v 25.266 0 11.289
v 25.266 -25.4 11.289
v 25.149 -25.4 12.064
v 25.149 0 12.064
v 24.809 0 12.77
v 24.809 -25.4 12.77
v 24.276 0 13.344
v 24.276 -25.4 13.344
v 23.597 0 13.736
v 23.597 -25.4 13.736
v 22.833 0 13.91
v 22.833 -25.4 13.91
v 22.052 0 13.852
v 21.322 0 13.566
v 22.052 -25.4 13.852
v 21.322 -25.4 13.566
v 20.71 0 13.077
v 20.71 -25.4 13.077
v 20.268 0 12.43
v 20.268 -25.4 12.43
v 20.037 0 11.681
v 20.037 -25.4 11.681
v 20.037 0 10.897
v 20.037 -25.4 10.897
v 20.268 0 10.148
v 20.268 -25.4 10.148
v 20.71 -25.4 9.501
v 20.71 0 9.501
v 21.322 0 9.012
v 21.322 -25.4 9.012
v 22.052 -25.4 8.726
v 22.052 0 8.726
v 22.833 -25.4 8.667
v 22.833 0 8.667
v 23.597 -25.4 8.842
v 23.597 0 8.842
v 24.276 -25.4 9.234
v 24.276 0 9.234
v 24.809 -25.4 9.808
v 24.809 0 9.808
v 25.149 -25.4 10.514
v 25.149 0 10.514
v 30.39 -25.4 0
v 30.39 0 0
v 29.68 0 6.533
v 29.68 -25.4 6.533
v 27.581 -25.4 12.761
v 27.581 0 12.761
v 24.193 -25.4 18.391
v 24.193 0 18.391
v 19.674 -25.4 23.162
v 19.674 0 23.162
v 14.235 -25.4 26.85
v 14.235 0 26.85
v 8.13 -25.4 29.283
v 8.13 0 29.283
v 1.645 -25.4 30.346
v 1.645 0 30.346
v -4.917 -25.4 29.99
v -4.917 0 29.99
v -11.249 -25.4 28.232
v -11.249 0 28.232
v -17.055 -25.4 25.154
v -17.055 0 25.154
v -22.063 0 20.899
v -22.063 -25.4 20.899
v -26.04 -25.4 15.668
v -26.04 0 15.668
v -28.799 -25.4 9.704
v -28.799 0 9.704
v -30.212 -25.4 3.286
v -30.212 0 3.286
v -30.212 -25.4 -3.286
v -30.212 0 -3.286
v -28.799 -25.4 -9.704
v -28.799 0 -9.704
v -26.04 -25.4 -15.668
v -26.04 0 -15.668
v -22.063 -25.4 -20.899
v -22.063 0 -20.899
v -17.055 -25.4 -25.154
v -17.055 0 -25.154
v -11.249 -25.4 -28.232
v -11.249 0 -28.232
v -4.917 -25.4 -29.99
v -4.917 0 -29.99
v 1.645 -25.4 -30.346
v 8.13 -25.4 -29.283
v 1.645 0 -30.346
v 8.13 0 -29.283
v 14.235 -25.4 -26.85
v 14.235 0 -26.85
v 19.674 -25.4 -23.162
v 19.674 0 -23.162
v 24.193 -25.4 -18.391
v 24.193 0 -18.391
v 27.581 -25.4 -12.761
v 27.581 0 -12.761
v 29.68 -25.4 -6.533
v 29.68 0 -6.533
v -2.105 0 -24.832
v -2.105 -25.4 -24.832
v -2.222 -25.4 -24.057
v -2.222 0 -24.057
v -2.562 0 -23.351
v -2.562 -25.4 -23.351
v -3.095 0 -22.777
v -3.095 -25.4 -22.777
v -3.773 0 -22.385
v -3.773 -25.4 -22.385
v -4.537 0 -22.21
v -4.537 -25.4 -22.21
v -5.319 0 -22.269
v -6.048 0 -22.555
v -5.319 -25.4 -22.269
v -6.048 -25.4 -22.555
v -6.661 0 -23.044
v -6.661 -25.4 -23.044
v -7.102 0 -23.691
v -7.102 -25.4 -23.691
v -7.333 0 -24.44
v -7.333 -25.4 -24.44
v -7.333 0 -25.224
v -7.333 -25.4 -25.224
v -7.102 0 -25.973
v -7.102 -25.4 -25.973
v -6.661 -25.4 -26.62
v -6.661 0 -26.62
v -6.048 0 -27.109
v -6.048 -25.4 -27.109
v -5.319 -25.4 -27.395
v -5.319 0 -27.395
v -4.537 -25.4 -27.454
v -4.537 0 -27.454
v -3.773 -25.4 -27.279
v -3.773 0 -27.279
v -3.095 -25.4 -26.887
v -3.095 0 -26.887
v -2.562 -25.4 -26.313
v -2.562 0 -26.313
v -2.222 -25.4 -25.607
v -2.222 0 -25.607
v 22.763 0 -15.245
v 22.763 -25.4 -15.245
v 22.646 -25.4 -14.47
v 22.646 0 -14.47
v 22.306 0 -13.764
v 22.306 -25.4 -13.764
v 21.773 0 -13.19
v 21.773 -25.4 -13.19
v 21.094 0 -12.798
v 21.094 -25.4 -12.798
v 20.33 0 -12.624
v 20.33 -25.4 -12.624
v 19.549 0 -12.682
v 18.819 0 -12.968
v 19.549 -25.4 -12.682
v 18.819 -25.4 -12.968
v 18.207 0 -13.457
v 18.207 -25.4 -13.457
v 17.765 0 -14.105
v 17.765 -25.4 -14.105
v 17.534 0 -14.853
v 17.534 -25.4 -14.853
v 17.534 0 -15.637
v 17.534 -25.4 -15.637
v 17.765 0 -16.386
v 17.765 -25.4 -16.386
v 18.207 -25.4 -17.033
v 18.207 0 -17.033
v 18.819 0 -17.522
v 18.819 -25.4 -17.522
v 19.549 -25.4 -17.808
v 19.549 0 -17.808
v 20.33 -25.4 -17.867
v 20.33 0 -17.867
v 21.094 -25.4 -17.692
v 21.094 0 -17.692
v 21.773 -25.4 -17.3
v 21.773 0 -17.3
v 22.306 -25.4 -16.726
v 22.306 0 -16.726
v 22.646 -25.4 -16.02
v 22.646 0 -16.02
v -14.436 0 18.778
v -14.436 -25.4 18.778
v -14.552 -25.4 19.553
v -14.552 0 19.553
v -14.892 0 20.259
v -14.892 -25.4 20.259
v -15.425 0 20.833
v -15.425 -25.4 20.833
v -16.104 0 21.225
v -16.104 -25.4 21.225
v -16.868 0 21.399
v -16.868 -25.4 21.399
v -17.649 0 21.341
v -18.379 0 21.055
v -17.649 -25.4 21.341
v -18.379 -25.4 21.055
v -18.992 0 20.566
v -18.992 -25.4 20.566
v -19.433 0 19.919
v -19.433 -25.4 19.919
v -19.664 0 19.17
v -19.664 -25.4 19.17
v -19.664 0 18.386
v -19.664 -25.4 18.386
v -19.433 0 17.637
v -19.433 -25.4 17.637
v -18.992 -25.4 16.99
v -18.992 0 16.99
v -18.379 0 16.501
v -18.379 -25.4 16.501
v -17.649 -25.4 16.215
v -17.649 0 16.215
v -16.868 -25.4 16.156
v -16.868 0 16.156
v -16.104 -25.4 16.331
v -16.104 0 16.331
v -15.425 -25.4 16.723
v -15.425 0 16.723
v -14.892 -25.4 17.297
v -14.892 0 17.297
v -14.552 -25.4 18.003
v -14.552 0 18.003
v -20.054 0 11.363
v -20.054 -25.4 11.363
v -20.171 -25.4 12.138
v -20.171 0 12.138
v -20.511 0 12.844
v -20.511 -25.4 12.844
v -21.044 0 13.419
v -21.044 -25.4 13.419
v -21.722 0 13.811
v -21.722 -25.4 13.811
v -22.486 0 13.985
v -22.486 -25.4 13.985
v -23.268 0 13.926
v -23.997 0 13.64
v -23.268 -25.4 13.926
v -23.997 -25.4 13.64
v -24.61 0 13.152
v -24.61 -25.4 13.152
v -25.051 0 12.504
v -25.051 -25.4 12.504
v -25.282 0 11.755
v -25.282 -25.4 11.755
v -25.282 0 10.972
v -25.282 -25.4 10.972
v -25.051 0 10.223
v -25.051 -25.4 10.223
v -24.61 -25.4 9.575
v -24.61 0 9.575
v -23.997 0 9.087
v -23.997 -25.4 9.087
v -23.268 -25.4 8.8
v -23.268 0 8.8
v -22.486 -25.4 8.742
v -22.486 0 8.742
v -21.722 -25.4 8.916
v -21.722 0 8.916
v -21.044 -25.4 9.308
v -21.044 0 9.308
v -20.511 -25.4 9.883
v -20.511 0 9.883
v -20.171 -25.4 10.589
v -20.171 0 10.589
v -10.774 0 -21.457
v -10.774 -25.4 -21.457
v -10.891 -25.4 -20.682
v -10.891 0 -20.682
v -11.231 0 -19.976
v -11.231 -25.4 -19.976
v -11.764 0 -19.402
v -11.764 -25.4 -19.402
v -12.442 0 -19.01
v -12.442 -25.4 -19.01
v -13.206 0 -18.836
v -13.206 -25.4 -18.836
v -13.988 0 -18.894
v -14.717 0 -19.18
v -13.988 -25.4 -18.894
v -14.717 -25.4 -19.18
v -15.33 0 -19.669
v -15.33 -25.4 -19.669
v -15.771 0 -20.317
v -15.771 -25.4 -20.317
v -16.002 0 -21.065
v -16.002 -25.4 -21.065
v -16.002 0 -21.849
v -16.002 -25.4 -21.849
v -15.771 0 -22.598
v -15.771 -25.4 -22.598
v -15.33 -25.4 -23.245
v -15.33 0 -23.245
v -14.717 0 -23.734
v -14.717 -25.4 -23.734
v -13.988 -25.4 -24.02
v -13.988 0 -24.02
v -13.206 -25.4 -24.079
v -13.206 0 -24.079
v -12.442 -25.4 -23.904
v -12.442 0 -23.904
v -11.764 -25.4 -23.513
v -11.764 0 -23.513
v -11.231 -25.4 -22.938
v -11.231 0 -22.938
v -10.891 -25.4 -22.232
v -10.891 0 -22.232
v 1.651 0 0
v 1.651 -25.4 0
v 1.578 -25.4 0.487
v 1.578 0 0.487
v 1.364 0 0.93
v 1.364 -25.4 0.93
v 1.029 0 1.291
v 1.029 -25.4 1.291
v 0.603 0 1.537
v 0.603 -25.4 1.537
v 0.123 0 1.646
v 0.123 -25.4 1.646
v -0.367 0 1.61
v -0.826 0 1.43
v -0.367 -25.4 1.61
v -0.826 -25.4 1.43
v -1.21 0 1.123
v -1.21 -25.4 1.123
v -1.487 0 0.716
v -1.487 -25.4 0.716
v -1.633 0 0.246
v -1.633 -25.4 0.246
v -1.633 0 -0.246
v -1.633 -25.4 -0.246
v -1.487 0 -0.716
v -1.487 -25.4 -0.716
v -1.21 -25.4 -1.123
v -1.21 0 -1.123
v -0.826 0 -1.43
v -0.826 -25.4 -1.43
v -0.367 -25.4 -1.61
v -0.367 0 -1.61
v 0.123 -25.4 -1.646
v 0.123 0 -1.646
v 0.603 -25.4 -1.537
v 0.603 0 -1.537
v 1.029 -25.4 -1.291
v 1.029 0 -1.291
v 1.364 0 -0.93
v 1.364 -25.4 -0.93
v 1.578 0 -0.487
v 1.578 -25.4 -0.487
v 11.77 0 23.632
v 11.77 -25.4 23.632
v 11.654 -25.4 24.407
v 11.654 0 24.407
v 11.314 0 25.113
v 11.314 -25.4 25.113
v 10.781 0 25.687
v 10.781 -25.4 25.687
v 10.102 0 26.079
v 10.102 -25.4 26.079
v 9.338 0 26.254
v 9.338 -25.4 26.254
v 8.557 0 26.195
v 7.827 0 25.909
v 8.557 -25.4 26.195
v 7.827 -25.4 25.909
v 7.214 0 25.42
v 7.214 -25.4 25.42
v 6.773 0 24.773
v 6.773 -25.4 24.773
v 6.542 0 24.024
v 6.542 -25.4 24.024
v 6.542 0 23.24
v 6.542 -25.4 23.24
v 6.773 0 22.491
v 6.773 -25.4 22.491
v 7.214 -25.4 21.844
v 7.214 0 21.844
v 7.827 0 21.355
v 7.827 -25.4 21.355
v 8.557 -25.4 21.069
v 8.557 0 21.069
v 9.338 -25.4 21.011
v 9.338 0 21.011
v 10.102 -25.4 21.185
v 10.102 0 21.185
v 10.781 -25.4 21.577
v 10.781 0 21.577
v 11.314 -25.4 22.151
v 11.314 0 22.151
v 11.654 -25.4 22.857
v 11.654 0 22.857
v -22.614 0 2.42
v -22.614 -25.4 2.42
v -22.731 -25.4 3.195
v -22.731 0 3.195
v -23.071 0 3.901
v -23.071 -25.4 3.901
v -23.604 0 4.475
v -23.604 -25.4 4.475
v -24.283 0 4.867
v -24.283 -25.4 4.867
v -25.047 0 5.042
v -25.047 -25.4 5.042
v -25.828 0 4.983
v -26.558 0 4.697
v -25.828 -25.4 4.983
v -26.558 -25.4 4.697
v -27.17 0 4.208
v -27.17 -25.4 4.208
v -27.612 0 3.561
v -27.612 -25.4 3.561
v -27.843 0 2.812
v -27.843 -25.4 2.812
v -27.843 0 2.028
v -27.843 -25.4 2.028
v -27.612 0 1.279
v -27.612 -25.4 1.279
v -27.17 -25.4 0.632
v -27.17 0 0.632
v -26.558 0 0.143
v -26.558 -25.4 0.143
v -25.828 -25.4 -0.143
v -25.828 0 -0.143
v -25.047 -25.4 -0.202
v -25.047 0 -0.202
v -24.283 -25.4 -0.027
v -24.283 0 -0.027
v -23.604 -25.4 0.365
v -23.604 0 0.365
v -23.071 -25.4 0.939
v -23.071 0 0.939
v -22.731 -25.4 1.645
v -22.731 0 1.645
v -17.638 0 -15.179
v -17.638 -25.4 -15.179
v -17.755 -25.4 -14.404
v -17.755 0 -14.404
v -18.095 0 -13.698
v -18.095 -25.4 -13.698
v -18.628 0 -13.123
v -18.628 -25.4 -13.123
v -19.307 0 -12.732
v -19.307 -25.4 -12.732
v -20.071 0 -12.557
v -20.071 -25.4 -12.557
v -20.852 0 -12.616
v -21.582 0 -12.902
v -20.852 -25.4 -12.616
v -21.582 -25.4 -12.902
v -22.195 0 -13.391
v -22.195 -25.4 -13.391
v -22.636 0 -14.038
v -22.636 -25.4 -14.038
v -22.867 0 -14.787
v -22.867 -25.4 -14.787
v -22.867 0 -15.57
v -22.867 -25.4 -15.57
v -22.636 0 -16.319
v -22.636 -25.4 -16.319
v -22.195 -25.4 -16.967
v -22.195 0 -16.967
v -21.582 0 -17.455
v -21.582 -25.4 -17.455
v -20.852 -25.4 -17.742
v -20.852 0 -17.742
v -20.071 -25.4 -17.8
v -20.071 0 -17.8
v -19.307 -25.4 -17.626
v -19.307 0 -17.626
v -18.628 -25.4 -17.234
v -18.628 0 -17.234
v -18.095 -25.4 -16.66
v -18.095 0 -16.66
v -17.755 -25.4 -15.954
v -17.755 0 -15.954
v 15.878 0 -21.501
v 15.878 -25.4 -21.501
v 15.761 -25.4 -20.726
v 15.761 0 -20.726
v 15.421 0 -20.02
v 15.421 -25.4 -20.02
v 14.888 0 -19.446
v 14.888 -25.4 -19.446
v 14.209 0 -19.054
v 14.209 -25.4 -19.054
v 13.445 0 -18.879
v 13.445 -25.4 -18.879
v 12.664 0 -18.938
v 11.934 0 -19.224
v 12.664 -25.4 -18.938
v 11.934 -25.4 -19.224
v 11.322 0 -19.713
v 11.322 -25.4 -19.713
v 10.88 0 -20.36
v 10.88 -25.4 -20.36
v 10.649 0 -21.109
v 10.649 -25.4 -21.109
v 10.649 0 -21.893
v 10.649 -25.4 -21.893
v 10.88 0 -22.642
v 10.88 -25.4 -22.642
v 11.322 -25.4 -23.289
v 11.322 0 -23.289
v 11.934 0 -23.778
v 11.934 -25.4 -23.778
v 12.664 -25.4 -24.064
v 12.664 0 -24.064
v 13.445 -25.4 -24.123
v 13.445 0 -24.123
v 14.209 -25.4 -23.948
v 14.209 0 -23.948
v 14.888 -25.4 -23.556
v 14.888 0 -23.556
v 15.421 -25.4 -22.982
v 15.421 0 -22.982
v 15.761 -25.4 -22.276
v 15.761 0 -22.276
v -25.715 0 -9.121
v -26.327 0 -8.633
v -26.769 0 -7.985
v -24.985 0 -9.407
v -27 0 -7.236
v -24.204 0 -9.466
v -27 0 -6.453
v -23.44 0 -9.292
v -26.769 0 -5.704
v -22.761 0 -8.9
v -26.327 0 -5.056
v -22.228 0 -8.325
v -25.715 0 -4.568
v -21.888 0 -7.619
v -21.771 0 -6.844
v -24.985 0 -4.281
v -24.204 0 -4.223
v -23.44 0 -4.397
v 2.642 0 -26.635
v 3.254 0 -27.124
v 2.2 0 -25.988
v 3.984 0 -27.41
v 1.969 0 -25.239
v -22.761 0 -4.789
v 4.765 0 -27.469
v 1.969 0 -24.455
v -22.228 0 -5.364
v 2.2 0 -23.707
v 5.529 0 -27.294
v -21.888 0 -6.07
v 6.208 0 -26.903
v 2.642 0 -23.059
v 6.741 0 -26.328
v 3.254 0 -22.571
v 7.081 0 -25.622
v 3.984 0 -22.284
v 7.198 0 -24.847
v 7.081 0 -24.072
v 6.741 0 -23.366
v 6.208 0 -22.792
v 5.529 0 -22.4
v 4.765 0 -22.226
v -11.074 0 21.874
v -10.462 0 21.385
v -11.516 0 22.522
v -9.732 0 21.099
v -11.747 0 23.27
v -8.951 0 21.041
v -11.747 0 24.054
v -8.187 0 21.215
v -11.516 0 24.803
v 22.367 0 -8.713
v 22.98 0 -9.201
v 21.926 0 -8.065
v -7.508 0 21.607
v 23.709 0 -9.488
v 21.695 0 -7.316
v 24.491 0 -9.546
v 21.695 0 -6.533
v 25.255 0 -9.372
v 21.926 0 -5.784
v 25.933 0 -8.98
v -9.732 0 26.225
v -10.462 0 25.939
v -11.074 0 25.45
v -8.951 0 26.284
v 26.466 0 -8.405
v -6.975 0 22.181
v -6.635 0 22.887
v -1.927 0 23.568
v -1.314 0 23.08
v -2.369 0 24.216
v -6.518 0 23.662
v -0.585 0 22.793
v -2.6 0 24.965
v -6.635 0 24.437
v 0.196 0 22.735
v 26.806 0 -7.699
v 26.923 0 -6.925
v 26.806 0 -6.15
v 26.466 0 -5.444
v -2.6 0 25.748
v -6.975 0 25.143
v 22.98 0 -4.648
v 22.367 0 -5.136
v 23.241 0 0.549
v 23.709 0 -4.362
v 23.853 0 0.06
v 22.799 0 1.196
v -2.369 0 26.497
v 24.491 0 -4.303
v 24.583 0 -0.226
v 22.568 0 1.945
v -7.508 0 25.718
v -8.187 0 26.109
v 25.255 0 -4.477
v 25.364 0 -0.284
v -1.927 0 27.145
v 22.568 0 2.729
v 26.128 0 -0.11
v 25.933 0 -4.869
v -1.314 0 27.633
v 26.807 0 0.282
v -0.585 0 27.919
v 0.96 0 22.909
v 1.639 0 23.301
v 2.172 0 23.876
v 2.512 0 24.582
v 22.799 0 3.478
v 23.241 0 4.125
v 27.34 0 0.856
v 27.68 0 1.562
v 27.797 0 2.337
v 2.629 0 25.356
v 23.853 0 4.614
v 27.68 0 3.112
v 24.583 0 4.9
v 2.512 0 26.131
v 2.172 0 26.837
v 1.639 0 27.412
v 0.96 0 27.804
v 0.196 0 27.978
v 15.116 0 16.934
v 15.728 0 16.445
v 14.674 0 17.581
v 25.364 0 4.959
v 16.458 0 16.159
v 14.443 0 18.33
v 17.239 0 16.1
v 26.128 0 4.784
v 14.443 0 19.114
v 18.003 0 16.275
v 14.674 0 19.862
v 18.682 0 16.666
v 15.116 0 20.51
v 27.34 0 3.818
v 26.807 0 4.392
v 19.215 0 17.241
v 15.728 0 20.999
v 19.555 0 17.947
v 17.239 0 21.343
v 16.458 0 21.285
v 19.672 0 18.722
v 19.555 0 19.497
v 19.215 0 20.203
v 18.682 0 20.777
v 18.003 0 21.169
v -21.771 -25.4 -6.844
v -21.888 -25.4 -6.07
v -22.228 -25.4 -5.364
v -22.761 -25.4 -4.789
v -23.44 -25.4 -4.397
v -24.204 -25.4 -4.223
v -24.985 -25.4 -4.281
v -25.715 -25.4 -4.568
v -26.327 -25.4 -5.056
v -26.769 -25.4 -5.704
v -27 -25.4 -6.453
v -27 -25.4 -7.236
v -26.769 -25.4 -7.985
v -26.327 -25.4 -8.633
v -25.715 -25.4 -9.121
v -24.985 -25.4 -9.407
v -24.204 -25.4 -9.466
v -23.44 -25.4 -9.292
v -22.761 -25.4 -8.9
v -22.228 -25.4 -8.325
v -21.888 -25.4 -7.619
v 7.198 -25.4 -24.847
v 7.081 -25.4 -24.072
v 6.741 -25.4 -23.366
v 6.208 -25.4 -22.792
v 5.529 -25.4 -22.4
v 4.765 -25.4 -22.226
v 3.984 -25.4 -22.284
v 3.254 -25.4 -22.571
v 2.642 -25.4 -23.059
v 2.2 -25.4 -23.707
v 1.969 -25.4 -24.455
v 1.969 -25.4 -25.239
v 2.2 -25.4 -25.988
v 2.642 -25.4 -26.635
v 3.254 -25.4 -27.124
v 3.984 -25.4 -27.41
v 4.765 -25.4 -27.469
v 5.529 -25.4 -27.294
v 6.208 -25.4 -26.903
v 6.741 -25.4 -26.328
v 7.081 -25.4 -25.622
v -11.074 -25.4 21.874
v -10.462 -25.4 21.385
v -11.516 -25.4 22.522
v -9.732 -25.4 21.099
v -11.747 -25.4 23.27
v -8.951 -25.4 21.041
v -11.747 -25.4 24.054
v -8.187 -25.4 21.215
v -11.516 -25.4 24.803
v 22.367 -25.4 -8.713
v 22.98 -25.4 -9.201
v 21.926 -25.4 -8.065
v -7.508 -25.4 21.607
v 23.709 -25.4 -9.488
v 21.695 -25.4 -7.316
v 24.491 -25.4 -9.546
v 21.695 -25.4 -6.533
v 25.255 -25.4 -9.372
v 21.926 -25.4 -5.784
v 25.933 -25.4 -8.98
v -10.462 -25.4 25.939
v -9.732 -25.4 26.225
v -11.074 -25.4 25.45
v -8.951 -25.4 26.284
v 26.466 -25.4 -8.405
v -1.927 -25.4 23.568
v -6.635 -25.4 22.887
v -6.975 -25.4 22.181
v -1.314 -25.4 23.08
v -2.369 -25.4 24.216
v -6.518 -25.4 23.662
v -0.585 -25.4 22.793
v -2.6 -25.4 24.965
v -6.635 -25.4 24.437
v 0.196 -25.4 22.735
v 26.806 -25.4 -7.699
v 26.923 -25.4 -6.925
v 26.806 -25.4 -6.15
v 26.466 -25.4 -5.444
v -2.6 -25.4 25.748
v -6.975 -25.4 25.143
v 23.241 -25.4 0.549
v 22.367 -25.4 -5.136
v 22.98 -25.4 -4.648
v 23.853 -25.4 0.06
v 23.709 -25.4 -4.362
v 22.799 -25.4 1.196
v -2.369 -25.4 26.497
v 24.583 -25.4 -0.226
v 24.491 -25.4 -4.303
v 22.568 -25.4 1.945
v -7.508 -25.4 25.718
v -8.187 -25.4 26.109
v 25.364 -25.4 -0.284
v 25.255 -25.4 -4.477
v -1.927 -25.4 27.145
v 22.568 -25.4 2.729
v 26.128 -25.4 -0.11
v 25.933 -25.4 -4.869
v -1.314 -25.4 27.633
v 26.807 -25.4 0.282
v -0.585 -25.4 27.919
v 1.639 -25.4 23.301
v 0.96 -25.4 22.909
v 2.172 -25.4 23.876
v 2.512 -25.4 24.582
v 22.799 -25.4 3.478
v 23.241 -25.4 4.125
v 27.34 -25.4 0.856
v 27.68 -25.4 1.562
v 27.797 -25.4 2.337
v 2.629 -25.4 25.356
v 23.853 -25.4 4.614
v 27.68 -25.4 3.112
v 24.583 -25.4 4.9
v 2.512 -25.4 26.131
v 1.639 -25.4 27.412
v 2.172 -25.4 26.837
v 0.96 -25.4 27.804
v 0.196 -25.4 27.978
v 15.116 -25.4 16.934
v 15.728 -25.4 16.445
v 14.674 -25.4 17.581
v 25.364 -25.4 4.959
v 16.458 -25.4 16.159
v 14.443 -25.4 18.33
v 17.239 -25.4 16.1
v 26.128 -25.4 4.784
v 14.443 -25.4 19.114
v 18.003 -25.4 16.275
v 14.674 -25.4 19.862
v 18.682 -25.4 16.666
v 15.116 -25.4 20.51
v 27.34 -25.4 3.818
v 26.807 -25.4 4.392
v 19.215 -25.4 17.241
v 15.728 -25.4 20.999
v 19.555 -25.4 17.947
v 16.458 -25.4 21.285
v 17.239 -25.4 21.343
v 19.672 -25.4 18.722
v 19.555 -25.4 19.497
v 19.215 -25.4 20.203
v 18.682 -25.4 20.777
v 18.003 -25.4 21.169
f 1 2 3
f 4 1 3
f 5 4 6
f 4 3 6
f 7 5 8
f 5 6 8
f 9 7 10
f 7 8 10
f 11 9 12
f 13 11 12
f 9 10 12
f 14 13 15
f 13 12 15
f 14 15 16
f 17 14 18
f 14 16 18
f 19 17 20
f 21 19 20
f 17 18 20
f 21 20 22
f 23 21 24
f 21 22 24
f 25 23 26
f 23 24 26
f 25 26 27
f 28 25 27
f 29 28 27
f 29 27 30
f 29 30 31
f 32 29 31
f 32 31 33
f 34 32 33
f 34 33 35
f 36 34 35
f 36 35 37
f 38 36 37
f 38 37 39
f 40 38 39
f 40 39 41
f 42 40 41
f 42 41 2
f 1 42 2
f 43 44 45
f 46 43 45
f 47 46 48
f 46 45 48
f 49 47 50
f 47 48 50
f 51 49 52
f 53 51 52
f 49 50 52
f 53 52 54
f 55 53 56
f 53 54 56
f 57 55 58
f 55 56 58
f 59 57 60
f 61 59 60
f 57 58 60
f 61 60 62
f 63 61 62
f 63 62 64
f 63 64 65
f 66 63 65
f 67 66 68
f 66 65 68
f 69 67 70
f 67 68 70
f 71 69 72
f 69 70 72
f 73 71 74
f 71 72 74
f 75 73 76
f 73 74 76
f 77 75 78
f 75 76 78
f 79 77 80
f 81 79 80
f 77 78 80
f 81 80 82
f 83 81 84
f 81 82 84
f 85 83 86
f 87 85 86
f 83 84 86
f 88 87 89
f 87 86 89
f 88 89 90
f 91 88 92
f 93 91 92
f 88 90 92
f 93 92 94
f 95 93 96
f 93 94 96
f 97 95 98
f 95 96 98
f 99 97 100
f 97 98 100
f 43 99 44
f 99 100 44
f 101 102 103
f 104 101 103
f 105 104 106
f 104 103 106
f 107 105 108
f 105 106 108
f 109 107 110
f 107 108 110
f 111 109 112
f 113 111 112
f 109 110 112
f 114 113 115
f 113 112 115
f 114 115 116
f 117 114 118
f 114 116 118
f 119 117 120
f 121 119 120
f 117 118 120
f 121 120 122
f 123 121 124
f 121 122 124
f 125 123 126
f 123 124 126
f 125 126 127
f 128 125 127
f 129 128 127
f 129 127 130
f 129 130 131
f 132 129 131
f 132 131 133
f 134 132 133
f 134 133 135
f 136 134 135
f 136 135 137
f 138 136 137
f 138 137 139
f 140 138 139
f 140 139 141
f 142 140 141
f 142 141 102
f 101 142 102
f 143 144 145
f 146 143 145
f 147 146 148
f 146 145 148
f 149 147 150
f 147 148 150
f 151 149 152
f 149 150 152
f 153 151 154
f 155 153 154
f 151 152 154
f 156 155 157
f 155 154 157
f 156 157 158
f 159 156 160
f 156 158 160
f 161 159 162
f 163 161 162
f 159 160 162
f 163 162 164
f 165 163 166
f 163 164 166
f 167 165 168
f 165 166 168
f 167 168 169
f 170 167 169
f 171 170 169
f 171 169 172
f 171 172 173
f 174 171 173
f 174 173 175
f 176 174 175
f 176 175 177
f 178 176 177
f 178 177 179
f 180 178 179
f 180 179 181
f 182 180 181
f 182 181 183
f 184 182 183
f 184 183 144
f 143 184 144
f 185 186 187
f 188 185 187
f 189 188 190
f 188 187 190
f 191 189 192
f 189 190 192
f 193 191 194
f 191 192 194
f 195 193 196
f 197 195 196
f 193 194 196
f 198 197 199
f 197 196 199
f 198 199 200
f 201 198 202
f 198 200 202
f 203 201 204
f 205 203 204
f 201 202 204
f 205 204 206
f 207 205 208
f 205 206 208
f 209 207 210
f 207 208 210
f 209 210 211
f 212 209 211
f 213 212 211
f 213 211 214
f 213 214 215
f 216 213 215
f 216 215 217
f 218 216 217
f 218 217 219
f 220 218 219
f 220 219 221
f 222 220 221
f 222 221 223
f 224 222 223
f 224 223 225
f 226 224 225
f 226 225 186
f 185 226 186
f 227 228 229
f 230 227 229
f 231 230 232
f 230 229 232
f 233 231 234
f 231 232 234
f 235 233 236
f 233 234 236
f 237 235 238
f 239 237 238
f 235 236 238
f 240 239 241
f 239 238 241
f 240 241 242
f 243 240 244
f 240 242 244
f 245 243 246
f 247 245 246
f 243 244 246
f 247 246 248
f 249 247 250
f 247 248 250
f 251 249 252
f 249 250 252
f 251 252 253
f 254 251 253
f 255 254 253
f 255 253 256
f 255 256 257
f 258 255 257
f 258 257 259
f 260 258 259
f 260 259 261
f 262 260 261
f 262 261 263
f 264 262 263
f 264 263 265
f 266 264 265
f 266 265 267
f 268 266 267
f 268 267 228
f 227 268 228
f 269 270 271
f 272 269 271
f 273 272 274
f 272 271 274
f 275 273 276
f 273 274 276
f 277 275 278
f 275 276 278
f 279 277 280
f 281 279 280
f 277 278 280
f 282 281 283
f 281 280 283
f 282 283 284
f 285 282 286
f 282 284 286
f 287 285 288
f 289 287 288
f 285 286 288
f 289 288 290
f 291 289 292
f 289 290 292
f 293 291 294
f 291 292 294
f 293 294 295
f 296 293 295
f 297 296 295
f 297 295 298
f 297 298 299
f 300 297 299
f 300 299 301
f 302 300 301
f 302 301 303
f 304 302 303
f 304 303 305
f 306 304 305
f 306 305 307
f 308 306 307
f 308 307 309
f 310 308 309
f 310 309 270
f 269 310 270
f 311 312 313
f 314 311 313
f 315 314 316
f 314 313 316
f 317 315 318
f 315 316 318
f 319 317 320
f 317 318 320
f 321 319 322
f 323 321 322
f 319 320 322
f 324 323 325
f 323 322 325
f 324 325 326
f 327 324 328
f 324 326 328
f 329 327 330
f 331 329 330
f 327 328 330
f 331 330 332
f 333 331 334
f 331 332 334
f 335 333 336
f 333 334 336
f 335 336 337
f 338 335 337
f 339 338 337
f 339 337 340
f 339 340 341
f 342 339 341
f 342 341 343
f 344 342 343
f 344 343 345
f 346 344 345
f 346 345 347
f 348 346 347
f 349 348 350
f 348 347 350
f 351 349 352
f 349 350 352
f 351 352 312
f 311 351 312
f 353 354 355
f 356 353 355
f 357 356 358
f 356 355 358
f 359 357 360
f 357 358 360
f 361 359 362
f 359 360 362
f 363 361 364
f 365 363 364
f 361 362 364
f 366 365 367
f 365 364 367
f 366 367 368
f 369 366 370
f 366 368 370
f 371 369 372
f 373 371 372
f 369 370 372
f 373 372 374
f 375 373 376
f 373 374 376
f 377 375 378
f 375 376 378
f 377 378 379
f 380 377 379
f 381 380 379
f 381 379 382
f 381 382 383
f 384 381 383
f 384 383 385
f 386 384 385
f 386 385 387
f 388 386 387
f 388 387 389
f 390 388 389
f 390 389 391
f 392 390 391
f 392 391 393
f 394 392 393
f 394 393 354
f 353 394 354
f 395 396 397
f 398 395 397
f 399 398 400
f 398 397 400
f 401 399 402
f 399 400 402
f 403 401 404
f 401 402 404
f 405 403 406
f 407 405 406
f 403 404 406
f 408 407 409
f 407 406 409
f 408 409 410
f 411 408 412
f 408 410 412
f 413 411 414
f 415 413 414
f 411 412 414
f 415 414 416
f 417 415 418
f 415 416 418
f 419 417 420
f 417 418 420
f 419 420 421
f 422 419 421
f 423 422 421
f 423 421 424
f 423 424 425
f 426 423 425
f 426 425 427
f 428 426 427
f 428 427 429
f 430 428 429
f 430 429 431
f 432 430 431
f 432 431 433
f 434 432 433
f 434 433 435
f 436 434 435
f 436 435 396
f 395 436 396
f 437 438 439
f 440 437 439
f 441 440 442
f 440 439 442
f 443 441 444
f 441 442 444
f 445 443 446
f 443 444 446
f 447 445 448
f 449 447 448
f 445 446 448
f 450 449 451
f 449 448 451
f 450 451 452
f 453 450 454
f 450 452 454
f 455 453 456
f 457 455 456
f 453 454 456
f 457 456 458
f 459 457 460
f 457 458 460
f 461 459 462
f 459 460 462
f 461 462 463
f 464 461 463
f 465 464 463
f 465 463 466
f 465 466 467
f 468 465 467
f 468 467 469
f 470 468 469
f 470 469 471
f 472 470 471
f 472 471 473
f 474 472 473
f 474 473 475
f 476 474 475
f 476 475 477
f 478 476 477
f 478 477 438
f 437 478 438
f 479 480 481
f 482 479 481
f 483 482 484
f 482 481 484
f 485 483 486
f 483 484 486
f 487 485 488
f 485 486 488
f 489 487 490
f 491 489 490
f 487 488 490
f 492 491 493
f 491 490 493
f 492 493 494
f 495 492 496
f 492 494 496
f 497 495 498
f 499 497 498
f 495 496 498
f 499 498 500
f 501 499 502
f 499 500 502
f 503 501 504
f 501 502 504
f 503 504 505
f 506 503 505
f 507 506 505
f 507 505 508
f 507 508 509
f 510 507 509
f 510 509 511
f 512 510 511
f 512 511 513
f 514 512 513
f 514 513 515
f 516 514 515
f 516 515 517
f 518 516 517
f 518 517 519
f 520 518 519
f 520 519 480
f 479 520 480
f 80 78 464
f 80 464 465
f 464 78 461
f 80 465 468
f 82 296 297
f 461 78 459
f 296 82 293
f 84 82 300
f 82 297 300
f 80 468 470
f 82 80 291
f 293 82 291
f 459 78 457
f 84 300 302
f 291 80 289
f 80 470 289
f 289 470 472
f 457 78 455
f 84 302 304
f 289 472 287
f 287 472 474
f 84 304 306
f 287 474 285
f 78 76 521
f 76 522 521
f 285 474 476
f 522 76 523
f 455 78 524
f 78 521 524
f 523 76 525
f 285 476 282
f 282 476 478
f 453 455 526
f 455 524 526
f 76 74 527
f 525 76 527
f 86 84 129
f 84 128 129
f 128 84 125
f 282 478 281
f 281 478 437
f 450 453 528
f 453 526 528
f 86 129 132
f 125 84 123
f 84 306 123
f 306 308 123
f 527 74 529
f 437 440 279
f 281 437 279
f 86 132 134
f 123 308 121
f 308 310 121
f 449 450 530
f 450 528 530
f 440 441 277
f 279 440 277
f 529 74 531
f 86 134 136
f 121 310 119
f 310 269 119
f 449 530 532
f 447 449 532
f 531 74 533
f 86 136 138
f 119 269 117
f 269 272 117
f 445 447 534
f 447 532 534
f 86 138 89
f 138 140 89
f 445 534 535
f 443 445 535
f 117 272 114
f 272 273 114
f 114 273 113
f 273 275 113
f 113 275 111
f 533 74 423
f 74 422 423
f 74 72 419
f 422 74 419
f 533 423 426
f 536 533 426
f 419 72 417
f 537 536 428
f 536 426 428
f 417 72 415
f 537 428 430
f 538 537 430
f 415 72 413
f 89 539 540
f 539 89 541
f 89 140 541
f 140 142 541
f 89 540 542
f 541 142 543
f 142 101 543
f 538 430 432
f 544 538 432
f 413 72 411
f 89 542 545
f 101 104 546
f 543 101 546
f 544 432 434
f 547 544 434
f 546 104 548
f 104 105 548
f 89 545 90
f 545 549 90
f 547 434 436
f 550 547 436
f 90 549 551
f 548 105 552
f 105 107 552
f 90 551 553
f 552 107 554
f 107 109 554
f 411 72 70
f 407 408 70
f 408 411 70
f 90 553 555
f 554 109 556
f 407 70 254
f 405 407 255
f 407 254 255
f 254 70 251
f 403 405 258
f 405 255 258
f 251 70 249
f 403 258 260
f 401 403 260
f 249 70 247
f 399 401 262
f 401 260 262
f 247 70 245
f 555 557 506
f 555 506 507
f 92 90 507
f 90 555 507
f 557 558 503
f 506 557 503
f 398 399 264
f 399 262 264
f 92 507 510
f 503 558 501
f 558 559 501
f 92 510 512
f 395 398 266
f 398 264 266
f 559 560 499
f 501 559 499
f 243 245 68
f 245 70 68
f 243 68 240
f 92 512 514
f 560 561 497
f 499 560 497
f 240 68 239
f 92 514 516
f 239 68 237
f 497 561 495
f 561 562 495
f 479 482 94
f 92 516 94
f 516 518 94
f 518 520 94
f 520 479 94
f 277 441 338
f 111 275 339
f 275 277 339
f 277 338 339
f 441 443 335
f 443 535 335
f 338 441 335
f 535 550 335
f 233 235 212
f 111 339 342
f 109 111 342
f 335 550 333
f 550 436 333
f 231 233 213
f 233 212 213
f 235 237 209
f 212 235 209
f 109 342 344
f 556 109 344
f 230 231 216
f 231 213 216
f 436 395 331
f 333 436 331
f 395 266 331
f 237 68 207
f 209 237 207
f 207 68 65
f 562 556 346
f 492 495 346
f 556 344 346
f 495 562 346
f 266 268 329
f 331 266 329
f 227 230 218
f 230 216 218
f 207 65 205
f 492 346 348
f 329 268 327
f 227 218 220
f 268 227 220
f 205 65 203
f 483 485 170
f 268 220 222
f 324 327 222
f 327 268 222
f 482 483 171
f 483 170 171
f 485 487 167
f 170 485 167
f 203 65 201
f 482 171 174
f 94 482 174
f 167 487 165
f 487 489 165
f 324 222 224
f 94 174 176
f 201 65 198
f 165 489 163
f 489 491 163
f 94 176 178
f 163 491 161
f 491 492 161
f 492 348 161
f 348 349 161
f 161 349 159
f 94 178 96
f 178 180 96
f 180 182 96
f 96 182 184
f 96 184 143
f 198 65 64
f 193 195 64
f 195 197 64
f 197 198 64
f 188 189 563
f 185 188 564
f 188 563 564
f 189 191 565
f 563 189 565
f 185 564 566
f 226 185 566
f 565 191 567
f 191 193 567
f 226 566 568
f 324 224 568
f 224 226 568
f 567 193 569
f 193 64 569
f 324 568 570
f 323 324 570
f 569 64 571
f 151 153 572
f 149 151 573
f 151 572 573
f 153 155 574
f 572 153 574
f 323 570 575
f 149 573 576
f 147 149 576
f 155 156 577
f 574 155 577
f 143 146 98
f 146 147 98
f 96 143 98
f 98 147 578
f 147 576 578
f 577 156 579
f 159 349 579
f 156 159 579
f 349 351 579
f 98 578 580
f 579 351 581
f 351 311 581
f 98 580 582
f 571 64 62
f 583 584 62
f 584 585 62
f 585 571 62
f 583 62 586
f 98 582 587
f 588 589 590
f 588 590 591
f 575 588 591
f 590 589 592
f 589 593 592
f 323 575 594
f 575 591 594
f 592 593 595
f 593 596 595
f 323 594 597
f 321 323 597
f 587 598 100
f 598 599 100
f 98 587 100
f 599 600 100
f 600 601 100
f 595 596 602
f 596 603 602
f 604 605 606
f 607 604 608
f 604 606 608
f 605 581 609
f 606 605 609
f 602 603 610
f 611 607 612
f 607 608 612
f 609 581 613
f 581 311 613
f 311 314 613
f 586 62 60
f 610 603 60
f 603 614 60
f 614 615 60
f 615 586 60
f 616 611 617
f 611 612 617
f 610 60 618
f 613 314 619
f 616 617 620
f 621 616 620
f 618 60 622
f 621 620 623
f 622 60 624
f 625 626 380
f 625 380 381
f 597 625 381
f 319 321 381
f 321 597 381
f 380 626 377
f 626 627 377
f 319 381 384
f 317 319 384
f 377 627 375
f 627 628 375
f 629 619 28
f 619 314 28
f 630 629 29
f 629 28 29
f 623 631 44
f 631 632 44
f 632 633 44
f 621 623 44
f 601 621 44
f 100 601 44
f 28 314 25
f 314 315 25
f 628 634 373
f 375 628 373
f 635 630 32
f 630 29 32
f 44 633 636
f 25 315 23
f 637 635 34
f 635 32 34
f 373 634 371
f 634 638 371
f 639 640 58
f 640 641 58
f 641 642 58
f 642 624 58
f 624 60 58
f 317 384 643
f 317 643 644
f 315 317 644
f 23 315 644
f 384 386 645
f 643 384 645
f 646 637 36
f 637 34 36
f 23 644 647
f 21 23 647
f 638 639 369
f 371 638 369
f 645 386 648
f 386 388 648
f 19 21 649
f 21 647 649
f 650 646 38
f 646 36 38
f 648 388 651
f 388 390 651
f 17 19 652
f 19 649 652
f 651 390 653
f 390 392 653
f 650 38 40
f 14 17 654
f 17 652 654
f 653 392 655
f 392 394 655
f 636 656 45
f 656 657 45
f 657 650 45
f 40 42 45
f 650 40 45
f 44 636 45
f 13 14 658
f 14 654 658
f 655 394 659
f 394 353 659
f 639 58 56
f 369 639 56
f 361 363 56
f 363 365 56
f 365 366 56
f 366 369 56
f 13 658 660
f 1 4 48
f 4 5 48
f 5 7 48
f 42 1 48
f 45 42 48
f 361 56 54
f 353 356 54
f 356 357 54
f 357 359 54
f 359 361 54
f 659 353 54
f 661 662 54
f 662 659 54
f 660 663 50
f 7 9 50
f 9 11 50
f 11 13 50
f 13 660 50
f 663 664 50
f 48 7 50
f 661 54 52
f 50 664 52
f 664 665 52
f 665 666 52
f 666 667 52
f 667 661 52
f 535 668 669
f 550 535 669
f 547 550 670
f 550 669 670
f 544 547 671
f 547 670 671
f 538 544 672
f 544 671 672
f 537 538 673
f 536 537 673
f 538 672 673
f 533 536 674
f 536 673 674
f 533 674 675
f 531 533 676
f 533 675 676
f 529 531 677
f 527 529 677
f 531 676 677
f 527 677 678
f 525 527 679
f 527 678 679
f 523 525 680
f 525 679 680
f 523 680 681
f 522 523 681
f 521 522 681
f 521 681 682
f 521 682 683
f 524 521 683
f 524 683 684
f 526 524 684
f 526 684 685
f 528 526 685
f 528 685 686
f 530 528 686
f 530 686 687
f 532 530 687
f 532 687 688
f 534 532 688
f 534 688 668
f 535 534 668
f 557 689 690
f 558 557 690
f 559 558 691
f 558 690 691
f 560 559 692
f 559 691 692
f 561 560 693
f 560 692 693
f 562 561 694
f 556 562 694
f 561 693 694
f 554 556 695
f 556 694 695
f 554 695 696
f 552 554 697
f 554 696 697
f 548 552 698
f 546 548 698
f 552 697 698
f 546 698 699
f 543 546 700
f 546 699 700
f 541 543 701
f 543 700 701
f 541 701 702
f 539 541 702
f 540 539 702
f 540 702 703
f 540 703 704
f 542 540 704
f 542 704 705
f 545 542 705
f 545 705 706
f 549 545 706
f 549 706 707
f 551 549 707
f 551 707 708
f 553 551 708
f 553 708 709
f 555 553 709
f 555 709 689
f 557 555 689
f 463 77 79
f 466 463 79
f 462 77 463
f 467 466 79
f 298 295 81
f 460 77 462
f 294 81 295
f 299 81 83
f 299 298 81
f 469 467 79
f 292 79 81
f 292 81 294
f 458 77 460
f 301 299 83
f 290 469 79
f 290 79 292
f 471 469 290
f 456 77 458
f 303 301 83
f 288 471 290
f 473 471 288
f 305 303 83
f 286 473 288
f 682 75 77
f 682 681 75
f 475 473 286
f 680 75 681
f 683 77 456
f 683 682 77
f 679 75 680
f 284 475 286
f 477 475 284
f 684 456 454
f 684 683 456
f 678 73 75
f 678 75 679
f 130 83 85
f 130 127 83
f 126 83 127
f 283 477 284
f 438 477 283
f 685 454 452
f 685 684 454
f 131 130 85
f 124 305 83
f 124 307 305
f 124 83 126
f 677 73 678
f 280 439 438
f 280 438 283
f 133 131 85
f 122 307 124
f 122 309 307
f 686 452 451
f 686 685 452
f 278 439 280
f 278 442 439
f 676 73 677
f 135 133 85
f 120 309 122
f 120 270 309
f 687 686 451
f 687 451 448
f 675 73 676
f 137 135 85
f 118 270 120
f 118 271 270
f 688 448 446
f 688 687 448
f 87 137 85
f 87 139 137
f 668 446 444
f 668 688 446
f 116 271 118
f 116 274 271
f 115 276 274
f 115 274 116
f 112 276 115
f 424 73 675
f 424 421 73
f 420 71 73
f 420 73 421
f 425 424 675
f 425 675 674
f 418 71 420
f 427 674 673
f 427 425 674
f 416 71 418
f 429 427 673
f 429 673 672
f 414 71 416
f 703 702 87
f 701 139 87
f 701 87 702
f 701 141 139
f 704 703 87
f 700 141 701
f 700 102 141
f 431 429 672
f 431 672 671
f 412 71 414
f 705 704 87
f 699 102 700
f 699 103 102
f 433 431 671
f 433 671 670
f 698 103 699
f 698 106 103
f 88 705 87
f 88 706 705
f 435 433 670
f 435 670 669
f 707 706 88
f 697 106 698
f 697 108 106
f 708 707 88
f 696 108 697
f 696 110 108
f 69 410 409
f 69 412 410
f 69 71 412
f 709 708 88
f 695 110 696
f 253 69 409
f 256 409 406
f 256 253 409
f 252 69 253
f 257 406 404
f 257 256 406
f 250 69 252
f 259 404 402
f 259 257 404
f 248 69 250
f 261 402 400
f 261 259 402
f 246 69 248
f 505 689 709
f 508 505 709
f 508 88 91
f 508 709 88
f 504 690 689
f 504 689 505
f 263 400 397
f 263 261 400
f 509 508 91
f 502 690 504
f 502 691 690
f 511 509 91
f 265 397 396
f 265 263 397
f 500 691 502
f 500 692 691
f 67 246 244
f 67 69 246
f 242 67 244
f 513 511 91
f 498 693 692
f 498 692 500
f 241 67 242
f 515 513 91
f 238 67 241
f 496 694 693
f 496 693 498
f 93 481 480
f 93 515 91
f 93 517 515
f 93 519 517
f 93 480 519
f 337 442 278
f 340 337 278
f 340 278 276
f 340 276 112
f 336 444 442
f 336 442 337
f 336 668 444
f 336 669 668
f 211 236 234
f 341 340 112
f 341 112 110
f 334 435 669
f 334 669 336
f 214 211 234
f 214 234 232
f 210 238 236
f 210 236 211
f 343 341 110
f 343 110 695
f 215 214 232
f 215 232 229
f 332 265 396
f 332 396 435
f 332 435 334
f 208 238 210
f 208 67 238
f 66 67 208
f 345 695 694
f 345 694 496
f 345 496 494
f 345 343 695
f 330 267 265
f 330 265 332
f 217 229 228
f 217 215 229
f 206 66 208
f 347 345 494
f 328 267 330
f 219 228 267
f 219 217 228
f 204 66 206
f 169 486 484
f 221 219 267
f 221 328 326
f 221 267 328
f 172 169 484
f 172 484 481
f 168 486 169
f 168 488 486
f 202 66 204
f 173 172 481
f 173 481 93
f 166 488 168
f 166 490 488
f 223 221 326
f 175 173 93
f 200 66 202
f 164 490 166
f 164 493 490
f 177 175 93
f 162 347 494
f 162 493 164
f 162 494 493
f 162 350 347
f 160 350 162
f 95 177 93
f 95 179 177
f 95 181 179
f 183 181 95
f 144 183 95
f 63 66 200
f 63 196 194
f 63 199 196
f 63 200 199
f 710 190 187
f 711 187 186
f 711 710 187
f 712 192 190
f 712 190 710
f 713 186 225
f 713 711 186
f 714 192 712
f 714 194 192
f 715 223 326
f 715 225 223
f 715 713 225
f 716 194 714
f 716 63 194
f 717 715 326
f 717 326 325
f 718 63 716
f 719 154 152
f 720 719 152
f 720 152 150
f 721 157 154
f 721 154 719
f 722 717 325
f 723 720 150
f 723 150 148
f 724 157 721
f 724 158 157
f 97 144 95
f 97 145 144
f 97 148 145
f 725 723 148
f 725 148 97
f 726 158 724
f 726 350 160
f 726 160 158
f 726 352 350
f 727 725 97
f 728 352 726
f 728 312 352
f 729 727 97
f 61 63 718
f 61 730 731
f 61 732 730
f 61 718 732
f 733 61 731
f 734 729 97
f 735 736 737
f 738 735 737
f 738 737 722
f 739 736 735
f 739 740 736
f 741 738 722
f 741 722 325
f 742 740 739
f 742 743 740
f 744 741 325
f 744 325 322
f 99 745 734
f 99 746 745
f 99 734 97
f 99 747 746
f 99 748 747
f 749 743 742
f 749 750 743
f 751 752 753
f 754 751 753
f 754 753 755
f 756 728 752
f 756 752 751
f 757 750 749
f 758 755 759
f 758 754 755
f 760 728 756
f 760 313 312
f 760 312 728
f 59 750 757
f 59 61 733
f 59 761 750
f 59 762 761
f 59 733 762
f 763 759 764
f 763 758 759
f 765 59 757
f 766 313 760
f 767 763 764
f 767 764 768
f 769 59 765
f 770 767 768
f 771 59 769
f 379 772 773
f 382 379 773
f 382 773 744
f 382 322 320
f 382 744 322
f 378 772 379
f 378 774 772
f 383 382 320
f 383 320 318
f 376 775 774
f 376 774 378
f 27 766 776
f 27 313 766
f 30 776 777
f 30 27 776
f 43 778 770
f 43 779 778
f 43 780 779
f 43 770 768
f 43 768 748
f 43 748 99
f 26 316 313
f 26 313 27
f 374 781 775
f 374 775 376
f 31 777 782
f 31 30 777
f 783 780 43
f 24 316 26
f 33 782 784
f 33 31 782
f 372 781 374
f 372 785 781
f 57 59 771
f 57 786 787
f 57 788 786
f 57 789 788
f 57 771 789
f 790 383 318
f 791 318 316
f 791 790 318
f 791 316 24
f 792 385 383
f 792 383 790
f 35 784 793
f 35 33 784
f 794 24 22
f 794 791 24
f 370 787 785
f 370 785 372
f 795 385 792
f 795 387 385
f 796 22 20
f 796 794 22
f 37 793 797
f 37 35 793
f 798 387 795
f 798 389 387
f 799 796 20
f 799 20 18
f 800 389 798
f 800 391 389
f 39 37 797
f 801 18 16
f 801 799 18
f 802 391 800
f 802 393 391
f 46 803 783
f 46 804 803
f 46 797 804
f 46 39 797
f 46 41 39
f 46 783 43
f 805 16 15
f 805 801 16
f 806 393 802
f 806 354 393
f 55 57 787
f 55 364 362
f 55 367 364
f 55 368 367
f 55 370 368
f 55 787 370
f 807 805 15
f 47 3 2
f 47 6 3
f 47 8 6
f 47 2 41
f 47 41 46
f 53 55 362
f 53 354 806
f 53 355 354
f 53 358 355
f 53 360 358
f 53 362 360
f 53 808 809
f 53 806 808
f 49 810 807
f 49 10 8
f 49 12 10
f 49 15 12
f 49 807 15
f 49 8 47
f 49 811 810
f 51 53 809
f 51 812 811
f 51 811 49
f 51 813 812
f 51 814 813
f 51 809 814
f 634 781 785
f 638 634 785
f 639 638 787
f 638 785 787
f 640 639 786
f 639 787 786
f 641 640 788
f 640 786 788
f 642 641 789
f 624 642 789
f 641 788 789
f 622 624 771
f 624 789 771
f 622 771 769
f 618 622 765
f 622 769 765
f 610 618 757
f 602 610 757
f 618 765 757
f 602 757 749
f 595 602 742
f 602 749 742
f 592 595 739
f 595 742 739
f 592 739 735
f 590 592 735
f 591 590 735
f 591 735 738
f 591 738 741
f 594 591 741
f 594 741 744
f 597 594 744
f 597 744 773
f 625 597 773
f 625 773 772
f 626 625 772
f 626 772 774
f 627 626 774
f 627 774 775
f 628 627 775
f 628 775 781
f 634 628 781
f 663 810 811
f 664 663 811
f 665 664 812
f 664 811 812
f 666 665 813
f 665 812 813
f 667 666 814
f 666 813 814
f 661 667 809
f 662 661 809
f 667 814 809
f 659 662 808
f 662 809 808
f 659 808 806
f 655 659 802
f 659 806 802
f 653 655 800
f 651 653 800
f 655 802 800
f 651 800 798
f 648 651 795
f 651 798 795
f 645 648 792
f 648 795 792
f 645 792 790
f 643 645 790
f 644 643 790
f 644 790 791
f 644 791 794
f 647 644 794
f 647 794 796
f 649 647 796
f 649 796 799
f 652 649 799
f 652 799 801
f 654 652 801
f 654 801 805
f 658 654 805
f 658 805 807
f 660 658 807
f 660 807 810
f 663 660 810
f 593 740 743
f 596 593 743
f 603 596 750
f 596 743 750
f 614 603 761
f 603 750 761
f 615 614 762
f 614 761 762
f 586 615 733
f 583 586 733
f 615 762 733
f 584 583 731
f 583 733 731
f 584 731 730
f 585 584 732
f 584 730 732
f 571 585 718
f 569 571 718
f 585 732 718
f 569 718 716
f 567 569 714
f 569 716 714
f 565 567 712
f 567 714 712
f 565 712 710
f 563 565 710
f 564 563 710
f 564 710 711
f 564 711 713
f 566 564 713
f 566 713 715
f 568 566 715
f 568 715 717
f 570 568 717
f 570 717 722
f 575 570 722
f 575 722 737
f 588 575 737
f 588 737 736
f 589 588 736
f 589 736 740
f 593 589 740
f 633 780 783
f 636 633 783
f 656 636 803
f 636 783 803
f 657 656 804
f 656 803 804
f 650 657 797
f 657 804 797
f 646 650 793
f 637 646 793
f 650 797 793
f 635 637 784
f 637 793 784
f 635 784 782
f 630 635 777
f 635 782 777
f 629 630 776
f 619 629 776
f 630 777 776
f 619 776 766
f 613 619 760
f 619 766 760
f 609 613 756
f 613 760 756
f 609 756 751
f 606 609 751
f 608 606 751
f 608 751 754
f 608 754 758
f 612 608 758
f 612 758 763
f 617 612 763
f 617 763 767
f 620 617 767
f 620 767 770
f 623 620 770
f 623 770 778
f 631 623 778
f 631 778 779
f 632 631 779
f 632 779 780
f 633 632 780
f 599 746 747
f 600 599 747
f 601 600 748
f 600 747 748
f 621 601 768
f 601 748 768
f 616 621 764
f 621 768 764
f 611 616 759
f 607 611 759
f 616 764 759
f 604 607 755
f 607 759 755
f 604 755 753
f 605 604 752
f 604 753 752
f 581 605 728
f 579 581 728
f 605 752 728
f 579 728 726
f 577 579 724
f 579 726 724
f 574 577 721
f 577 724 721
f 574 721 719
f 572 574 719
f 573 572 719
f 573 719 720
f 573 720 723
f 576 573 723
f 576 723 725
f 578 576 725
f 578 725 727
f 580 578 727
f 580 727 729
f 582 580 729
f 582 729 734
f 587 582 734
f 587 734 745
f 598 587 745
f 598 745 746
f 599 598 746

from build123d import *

# Parameters (mm, degrees)
F0_R     = 30.3902596551
F1_DEPTH = 25.4
F2_R     = 2.6289
F3_DEPTH = 35.306
F4_R     = 1.651
F5_DEPTH = 25.4


# Not quite as in the source:
# - a feature names something its author has since deleted; it is built from what else it names


with BuildPart() as f1:
    # F0 (on Front) → F1 (new body)
    with BuildSketch(Plane.XZ):
        Circle(F0_R)
    extrude(amount=F1_DEPTH)

    # F2 (on face) → F3 (cut)
    with BuildSketch(Plane.XZ.offset(25.4)):
        with Locations((-9.1471226763, 23.6621449357)):
            Circle(F2_R)
        with Locations((0, 25.3564708744)):
            Circle(F2_R)
        with Locations((-20.2673863665, -15.1786801491)):
            Circle(F2_R)
        with Locations((-24.4002614445, -6.8444173004)):
            Circle(F2_R)
        with Locations((-25.2433696844, 2.4200180379)):
            Circle(F2_R)
        with Locations((-22.6828446466, 11.3634125374)):
            Circle(F2_R)
        with Locations((-17.0644994257, 18.7779112138)):
            Circle(F2_R)
        with Locations((-4.7339240202, -24.8319767568)):
            Circle(F2_R)
        with Locations((-13.4029121308, -21.4571821289)):
            Circle(F2_R)
        with Locations((4.5687830844, -24.847279318)):
            Circle(F2_R)
        with Locations((9.1414989998, 23.6320609235)):
            Circle(F2_R)
        with Locations((17.0427642284, 18.721806202)):
            Circle(F2_R)
        with Locations((22.6366860342, 11.2888638188)):
            Circle(F2_R)
        with Locations((25.1677742804, 2.33709383)):
            Circle(F2_R)
        with Locations((24.294191474, -6.9245176239)):
            Circle(F2_R)
        with Locations((20.1339198139, -15.2451385957)):
            Circle(F2_R)
        with Locations((13.2488270404, -21.5010231169)):
            Circle(F2_R)
    extrude(amount=-F3_DEPTH, mode=Mode.SUBTRACT)

    # F4 (on face) → F5 (cut)
    with BuildSketch(Plane.XZ.offset(25.4)):
        Circle(F4_R)
    extrude(amount=-F5_DEPTH, mode=Mode.SUBTRACT)


solid = f1.part
